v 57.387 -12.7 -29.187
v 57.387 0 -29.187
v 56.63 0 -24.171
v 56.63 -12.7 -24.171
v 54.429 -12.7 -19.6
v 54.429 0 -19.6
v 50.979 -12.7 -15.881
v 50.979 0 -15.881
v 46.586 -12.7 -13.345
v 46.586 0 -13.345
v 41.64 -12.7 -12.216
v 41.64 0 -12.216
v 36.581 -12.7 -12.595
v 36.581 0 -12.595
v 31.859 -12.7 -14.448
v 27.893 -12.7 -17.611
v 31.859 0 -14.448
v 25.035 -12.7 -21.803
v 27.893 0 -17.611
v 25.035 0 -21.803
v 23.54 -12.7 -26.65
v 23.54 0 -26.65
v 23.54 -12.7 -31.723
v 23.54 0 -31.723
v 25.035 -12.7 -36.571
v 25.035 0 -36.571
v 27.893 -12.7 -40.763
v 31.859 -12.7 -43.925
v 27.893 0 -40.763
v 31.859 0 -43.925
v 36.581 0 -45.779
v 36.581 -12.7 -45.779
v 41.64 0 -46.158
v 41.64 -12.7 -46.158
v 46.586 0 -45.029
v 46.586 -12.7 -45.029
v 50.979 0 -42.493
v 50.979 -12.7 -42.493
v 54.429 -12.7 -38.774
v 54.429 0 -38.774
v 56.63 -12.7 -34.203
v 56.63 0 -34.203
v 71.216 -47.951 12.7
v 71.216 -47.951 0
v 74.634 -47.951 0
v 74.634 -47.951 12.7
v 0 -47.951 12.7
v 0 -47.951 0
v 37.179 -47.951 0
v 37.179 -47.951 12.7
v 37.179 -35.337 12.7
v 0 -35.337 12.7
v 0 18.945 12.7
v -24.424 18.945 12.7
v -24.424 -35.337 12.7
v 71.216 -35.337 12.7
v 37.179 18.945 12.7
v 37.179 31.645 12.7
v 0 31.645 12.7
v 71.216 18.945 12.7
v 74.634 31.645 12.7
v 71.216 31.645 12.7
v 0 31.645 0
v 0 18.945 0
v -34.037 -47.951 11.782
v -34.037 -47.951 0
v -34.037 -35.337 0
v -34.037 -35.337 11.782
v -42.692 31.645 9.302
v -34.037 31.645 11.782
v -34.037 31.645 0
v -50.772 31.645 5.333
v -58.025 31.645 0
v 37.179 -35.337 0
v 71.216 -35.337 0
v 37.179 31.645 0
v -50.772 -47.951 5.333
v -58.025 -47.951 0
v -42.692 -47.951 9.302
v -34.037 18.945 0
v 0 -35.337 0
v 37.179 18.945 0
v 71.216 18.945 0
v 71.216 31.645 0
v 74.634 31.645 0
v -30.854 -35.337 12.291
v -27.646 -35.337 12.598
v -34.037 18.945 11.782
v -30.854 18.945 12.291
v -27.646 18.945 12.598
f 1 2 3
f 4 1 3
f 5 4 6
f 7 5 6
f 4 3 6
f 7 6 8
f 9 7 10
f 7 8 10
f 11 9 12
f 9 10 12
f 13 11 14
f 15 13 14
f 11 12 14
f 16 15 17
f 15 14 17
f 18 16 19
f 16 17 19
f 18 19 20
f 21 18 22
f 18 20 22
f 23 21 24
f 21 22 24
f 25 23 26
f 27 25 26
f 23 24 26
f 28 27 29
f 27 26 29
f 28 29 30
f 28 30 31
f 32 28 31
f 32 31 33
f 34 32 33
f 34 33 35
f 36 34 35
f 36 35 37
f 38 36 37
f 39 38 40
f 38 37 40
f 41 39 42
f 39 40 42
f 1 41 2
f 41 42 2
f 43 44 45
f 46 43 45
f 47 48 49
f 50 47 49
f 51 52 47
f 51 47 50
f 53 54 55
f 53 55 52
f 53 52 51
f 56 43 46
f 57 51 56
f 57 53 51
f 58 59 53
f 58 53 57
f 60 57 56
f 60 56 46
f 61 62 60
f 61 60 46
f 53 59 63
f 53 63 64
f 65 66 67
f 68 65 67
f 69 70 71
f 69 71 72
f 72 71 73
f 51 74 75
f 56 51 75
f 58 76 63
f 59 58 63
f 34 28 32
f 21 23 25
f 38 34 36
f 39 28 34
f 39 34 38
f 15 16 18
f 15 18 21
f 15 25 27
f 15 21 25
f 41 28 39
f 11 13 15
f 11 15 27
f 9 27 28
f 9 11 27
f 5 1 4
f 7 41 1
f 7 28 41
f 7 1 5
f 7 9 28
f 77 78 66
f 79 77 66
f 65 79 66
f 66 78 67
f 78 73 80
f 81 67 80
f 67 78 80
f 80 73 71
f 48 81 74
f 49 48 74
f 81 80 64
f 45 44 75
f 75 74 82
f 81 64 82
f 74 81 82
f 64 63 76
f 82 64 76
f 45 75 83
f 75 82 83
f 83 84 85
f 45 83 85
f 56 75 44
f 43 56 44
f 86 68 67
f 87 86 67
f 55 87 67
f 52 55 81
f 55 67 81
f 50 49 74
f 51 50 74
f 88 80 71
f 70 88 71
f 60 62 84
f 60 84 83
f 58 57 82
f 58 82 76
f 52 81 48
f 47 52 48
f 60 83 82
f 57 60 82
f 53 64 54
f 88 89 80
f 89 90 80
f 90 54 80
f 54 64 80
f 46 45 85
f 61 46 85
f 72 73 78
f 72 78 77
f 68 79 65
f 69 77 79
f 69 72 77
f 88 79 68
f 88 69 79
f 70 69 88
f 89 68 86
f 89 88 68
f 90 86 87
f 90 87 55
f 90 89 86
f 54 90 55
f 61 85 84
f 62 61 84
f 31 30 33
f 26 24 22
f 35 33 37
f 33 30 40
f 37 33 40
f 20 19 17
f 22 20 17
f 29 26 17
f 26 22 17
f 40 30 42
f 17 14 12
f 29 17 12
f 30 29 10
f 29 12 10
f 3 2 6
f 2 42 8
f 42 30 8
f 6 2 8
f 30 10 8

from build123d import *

# Parameters (mm, degrees)
F1_DEPTH    = 12.7
F2_T1_DEPTH = 247.6009079887
F3_R        = 17.0185577346
F4_DEPTH    = 12.7


# Not quite as in the source:
# - a fillet or chamfer that OpenCascade refuses, or shapes differently, is made with other operations: its cross-section is extruded or revolved along the edge and cut away or added


with BuildPart() as f1:
    # F0 (on Top) → F1 (new body)
    with BuildSketch(Plane.XY):
        Polygon((-34.0371176, 31.6446077985), (-58.0253747608, 31.6446077985), (-58.0253747608, -47.9510919376), (-34.0371176, -47.9510919376), (-34.0371176, -35.3372873902), (0, -35.3372873902), (0, -47.9510919376), (37.1790196625, -47.9510919376), (37.1790196625, -35.3372873902), (71.2161372625, -35.3372873902), (71.2161372625, -47.9510919376), (74.6341247993, -47.9510919376), (74.6341247993, 31.6446077985), (71.2161372625, 31.6446077985), (71.2161372625, 18.9446077985), (37.1790196625, 18.9446077985), (37.1790196625, 31.6446077985), (0, 31.6446077985), (0, 18.9446077985), (-34.0371176, 18.9446077985), align=None)
    extrude(amount=F1_DEPTH)

    # F2: fillet of radius 50.8 on 1 edges, made by hand

    # F2_s2 → F2_t1 (cut)
    with BuildSketch(Plane.XZ.offset(-115.6472119248)):
        with BuildLine():
            ThreePointArc((-58.0253747608, 0), (-42.3848453524, 9.419048812), (-24.4243331103, 12.7))
            Line((-24.4243331103, 12.7), (-58.0253747608, 12.7))
            Line((-58.0253747608, 12.7), (-58.0253747608, 0))
        make_face()
    extrude(amount=F2_T1_DEPTH, mode=Mode.SUBTRACT)


with BuildPart() as f4:
    # F3 (on Front) → F4 (new body)
    with BuildSketch(Plane.XZ):
        with Locations((40.3680205345, -29.1869509965)):
            Circle(F3_R)
    extrude(amount=F4_DEPTH)


solid = Compound([f1.part, f4.part])
